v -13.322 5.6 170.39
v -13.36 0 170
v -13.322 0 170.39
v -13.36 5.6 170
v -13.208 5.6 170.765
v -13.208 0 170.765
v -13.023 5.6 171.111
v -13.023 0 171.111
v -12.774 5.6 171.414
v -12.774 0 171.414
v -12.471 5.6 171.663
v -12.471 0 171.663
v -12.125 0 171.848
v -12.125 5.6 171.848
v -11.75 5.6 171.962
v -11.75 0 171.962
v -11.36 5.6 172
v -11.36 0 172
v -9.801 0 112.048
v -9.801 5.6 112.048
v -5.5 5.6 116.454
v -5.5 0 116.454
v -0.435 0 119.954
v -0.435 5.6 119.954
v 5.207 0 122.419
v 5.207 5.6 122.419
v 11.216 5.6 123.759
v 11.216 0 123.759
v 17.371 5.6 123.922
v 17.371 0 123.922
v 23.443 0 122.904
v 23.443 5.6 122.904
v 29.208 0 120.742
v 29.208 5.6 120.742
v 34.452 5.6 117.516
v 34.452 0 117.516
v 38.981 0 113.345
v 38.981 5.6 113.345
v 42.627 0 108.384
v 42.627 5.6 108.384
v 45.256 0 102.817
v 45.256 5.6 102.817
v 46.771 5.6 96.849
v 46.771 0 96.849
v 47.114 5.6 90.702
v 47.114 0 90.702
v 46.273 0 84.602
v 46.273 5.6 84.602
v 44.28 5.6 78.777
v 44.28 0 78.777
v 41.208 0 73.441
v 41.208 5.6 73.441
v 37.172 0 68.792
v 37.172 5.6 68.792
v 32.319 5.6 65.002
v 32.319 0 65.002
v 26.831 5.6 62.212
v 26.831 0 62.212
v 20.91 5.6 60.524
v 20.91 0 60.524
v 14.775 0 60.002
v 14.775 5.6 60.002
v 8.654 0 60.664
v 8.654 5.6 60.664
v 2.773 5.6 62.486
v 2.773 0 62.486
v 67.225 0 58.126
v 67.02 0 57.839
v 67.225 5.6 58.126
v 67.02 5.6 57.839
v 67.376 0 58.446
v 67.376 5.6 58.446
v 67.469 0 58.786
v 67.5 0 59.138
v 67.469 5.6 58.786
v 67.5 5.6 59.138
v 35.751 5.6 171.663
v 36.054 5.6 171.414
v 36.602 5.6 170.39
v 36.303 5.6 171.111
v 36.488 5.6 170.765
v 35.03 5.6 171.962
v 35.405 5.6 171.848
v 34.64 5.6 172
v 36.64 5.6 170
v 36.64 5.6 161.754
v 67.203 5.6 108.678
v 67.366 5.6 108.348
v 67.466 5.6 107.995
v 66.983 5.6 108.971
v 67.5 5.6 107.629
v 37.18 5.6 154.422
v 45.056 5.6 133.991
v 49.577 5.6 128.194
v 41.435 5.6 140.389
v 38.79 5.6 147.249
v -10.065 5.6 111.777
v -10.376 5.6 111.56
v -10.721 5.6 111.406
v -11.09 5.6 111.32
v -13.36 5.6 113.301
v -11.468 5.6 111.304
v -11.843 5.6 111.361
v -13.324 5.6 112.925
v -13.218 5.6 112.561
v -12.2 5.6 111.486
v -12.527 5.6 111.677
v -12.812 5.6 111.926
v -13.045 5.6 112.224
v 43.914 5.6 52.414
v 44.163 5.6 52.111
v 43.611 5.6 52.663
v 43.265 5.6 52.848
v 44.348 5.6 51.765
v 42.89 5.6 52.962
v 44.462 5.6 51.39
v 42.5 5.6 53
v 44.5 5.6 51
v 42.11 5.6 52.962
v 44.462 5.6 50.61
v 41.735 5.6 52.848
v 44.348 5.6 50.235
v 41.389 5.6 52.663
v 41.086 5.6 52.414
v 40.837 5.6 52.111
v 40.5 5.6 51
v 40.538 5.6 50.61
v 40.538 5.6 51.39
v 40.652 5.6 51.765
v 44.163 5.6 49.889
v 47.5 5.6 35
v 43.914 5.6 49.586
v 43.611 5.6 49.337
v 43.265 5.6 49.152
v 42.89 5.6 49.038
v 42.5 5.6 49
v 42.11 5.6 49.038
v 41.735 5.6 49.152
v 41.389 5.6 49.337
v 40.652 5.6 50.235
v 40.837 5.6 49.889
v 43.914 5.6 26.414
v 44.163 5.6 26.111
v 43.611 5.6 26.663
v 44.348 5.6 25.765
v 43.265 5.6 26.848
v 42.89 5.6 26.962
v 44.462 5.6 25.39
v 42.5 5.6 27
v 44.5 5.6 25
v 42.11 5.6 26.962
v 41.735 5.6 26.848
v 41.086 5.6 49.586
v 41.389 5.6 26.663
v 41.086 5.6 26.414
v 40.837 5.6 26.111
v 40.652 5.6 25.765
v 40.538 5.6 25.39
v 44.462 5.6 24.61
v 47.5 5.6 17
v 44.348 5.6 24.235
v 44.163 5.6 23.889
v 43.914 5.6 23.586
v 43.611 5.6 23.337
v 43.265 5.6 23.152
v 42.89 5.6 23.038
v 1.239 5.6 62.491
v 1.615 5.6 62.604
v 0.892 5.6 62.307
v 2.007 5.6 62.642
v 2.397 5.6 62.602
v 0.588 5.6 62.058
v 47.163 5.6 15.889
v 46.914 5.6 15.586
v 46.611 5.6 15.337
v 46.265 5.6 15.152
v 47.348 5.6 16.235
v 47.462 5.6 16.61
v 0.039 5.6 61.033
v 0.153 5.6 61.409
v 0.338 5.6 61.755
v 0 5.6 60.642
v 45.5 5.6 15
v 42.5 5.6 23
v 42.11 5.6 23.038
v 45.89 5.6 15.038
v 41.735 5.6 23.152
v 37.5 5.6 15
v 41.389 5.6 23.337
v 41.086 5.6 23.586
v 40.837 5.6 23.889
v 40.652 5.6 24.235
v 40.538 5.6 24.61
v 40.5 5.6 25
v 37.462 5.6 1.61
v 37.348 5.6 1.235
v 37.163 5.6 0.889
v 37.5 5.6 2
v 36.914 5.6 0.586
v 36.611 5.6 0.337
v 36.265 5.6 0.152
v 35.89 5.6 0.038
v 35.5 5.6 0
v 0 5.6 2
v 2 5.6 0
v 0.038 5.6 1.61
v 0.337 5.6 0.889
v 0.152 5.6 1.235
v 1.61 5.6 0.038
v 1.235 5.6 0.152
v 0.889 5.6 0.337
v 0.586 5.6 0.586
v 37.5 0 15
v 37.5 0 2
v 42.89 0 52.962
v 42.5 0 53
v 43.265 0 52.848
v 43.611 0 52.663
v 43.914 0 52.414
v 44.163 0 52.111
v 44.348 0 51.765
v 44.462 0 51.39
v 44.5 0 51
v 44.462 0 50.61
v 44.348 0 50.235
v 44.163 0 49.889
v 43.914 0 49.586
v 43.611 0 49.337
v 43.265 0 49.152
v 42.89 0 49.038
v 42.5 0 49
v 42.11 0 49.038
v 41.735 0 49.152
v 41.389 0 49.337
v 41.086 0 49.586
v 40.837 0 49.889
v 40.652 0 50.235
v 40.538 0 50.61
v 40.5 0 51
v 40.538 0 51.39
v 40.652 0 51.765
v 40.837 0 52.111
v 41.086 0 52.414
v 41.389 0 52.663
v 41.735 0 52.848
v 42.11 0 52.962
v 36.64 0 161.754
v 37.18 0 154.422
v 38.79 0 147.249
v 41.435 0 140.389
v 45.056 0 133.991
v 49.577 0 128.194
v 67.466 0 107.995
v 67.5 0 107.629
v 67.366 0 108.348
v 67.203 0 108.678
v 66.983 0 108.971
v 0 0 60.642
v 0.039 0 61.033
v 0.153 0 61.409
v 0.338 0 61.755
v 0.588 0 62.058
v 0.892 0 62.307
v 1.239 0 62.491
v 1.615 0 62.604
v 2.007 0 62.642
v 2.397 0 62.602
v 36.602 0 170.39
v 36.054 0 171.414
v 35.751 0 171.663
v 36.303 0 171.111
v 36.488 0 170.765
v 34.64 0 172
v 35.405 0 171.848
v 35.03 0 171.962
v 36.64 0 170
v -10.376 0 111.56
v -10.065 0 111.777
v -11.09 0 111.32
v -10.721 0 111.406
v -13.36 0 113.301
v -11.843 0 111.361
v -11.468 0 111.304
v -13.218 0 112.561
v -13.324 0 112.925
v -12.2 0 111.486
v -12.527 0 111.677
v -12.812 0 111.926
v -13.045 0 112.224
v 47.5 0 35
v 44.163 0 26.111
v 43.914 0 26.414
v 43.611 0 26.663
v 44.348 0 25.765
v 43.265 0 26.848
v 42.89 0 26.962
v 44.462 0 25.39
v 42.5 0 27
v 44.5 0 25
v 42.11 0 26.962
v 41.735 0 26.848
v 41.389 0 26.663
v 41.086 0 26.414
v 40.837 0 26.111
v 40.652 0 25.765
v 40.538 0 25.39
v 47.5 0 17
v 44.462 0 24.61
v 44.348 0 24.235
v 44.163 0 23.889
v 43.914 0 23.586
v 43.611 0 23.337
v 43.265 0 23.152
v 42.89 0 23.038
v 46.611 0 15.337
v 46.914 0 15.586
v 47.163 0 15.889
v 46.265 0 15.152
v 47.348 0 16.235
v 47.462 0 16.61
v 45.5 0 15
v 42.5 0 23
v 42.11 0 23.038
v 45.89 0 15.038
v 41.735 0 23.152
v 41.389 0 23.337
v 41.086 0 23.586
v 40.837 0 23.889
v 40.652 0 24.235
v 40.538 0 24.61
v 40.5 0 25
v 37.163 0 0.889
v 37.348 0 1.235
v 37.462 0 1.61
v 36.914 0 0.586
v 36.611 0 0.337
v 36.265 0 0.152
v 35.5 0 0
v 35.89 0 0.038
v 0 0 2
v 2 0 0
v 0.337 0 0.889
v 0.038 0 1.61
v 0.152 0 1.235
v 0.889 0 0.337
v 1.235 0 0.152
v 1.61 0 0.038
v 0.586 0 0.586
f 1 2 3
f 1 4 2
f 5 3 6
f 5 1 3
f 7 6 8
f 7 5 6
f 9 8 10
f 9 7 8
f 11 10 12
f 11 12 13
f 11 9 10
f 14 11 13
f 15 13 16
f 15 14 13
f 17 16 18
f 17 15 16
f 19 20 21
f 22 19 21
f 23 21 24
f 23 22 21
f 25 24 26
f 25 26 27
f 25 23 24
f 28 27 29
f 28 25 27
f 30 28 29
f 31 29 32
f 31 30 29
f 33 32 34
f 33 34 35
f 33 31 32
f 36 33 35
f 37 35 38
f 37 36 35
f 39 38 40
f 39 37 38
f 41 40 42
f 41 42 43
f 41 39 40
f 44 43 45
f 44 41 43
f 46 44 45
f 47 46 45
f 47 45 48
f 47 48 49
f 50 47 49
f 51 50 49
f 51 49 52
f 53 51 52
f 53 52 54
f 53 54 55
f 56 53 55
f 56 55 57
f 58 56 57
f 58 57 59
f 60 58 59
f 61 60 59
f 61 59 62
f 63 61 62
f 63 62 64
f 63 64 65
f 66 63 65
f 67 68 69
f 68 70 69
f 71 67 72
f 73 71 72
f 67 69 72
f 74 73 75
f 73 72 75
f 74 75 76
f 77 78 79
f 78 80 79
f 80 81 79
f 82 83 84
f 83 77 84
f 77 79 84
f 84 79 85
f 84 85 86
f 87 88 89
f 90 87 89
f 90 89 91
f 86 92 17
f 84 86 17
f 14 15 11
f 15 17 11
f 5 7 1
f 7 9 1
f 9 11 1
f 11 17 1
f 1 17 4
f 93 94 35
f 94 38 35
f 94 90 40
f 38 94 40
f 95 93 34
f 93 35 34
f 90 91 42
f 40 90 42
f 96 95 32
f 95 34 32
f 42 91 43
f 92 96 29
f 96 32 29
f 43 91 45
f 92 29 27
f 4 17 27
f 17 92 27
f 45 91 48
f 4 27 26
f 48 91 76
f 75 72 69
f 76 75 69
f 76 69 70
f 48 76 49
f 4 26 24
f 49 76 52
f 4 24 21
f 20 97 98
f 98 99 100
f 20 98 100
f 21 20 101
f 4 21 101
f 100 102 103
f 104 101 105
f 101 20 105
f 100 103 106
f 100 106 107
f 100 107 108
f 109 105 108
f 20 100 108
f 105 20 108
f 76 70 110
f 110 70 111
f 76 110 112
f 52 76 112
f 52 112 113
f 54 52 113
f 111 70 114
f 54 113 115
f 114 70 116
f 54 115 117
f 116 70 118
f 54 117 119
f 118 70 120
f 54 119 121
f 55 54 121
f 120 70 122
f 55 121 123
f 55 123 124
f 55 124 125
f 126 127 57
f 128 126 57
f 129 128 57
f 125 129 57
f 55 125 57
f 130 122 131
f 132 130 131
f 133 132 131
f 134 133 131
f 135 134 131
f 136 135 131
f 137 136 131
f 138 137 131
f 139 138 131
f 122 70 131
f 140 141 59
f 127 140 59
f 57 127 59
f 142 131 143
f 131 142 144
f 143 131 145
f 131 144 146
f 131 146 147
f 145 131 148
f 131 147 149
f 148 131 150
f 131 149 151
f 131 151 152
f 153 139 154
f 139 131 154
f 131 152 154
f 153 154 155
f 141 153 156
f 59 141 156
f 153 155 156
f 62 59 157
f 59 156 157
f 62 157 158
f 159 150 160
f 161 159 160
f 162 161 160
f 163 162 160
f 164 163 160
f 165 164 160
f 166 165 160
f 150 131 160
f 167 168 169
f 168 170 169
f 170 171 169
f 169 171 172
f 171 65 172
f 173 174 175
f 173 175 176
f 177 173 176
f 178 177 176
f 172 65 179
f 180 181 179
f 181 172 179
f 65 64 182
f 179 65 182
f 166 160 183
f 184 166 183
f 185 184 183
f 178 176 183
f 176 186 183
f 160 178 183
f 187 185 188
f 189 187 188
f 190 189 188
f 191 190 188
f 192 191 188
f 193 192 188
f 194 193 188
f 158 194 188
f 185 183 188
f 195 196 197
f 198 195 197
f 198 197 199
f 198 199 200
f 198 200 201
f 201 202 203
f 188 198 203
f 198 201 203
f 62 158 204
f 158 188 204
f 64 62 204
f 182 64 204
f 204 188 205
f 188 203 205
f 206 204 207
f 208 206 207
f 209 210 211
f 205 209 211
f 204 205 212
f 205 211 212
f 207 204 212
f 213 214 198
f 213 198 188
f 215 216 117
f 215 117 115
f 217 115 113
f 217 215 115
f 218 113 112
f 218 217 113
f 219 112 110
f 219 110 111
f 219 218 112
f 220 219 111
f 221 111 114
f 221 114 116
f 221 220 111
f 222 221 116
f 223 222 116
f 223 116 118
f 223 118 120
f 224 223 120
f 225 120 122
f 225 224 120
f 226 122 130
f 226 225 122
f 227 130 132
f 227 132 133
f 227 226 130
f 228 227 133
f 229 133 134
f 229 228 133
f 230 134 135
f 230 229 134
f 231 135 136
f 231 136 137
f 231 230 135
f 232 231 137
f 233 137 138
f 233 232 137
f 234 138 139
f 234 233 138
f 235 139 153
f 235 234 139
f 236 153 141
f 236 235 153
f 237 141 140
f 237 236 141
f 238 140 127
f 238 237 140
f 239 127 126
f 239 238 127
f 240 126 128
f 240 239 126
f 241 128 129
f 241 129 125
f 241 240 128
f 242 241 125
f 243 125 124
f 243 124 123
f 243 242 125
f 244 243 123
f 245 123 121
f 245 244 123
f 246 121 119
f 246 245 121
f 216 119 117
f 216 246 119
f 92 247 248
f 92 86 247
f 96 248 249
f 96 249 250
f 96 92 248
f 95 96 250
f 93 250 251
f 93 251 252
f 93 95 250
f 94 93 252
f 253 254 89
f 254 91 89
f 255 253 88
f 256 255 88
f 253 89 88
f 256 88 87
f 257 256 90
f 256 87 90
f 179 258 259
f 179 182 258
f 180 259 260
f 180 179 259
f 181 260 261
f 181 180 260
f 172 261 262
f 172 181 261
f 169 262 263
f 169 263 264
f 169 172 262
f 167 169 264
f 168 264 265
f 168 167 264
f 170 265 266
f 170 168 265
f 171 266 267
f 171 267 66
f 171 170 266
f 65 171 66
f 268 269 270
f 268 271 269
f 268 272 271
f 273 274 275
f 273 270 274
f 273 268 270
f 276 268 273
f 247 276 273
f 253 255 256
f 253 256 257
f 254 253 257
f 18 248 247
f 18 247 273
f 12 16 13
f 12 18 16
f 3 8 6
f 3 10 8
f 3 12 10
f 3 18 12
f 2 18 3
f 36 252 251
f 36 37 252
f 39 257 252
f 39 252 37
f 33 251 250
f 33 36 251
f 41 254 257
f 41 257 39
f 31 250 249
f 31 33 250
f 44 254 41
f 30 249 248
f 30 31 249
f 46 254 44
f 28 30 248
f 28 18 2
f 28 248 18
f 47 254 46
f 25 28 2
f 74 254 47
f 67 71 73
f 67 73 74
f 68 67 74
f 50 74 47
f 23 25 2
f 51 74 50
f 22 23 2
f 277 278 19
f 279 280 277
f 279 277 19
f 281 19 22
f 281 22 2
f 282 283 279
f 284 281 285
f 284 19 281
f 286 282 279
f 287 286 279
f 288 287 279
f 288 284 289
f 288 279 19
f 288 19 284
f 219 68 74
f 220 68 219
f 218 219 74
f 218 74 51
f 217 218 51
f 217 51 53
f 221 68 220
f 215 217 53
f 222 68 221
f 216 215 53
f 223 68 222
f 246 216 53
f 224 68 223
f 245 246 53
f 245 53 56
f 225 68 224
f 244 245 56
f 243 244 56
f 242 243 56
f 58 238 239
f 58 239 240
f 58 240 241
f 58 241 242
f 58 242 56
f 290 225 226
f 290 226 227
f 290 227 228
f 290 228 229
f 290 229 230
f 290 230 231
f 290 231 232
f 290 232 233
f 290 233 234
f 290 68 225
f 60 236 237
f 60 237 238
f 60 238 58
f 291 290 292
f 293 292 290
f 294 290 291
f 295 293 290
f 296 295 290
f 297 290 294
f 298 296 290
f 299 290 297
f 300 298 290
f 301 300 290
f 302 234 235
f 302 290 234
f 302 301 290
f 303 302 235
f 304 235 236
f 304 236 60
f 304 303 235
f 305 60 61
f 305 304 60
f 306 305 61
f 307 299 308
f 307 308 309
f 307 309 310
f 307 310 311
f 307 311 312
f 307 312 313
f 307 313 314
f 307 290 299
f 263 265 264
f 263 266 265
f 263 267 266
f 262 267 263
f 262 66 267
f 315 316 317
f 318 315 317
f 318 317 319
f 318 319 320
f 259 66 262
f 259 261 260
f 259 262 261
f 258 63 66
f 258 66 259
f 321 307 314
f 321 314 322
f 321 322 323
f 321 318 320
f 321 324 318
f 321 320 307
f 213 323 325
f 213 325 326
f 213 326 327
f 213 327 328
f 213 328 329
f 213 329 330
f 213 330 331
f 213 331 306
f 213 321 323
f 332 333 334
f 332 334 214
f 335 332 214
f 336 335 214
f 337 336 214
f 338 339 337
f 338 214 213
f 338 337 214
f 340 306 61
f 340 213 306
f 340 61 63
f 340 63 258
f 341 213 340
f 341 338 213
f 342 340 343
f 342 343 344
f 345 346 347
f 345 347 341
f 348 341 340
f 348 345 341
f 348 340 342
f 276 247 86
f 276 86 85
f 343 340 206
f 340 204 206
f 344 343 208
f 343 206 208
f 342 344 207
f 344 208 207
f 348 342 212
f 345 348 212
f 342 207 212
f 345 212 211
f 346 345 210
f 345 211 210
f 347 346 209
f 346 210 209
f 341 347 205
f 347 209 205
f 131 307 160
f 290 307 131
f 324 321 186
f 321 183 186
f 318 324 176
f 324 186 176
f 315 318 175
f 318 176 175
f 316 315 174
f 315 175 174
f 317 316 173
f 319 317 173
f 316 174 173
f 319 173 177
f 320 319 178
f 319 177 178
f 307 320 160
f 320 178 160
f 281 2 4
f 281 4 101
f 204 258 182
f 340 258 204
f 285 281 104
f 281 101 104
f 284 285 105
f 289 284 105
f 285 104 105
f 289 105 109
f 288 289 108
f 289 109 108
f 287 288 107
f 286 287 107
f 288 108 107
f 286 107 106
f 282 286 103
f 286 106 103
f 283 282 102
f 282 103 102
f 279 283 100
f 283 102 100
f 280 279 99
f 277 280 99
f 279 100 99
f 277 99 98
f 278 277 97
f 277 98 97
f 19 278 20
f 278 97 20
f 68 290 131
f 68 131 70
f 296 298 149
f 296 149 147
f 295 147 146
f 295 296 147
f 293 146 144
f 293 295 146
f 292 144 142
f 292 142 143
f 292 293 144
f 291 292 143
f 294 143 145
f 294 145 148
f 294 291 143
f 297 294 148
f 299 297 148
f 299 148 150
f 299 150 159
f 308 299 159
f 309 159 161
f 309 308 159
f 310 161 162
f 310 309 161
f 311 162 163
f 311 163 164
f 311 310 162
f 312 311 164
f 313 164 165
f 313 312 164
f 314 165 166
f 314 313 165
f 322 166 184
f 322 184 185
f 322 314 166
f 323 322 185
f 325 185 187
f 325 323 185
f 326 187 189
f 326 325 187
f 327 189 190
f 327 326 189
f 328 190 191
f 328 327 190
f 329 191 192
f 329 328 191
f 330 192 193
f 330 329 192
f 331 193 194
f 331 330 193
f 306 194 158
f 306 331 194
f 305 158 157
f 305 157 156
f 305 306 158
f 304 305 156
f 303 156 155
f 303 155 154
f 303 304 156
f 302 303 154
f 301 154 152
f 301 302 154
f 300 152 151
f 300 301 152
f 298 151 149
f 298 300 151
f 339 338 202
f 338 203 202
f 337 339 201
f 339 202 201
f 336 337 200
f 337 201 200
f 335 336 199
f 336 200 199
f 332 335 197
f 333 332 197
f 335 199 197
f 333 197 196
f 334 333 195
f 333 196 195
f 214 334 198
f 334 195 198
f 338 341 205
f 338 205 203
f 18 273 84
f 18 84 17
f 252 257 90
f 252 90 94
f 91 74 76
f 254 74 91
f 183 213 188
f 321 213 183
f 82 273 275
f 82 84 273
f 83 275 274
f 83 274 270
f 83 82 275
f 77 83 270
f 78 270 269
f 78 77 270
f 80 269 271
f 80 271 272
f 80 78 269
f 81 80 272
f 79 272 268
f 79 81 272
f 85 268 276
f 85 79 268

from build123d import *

# Parameters (mm, degrees)
SKETCH_1_R      = 2
EXTRUDE_1_DEPTH = 5.6
FILLET_1_R      = 2
FILLET_2_R      = 2
FILLET_3_R      = 50


with BuildPart() as part:
    # ｽｹｯﾁ1 → ﾎﾞｽ - 押し出し1 (new body)
    with BuildSketch(Plane(origin=(0, 0, 0), x_dir=(1, 0, 0), z_dir=(0, 1, 0))):
        with BuildLine():
            Line((47.5, -35), (67.5, -58.4))
            Line((67.5, -58.4), (67.5, -108.4))
            Line((67.5, -108.4), (36.64, -142.480487319))
            Line((36.64, -142.480487319), (36.64, -172))
            Line((36.64, -172), (-13.36, -172))
            Line((-13.36, -172), (-13.36, -106.551632211))
            ThreePointArc((-13.36, -106.551632211), (45.682817739, -101.546532593), (0, -63.808150114))
            Line((0, -63.808150114), (0, 0))
            Line((0, 0), (37.5, 0))
            Line((37.5, 0), (37.5, -15))
            Line((37.5, -15), (47.5, -15))
            Line((47.5, -15), (47.5, -35))
        make_face()
        with Locations(Location((42.5, -25, 0), (0, 0, 270))):
            Circle(SKETCH_1_R, mode=Mode.SUBTRACT)
        with Locations(Location((42.5, -51, 0), (0, 0, 270))):
            Circle(SKETCH_1_R, mode=Mode.SUBTRACT)
    extrude(amount=EXTRUDE_1_DEPTH)

    # ﾌｨﾚｯﾄ1
    fillet_1_edges = [part.edges().sort_by_distance(p)[0] for p in [
        (-13.36, 2.8, 106.551632211),
        (0, 2.8, 63.808150114),
    ]]
    fillet(fillet_1_edges, radius=FILLET_1_R)

    # ﾌｨﾚｯﾄ2
    fillet_2_edges = [part.edges().sort_by_distance(p)[0] for p in [
        (0, 2.8, 0),
        (37.5, 2.8, 0),
        (47.5, 2.8, 15),
        (67.5, 2.8, 58.4),
        (67.5, 2.8, 108.4),
        (36.64, 2.8, 172),
        (-13.36, 2.8, 172),
    ]]
    fillet(fillet_2_edges, radius=FILLET_2_R)

    # ﾌｨﾚｯﾄ3
    fillet_3_edges = [part.edges().sort_by_distance(p)[0] for p in [
        (36.64, 2.8, 142.480487319),
    ]]
    fillet(fillet_3_edges, radius=FILLET_3_R)


solid = part.part
